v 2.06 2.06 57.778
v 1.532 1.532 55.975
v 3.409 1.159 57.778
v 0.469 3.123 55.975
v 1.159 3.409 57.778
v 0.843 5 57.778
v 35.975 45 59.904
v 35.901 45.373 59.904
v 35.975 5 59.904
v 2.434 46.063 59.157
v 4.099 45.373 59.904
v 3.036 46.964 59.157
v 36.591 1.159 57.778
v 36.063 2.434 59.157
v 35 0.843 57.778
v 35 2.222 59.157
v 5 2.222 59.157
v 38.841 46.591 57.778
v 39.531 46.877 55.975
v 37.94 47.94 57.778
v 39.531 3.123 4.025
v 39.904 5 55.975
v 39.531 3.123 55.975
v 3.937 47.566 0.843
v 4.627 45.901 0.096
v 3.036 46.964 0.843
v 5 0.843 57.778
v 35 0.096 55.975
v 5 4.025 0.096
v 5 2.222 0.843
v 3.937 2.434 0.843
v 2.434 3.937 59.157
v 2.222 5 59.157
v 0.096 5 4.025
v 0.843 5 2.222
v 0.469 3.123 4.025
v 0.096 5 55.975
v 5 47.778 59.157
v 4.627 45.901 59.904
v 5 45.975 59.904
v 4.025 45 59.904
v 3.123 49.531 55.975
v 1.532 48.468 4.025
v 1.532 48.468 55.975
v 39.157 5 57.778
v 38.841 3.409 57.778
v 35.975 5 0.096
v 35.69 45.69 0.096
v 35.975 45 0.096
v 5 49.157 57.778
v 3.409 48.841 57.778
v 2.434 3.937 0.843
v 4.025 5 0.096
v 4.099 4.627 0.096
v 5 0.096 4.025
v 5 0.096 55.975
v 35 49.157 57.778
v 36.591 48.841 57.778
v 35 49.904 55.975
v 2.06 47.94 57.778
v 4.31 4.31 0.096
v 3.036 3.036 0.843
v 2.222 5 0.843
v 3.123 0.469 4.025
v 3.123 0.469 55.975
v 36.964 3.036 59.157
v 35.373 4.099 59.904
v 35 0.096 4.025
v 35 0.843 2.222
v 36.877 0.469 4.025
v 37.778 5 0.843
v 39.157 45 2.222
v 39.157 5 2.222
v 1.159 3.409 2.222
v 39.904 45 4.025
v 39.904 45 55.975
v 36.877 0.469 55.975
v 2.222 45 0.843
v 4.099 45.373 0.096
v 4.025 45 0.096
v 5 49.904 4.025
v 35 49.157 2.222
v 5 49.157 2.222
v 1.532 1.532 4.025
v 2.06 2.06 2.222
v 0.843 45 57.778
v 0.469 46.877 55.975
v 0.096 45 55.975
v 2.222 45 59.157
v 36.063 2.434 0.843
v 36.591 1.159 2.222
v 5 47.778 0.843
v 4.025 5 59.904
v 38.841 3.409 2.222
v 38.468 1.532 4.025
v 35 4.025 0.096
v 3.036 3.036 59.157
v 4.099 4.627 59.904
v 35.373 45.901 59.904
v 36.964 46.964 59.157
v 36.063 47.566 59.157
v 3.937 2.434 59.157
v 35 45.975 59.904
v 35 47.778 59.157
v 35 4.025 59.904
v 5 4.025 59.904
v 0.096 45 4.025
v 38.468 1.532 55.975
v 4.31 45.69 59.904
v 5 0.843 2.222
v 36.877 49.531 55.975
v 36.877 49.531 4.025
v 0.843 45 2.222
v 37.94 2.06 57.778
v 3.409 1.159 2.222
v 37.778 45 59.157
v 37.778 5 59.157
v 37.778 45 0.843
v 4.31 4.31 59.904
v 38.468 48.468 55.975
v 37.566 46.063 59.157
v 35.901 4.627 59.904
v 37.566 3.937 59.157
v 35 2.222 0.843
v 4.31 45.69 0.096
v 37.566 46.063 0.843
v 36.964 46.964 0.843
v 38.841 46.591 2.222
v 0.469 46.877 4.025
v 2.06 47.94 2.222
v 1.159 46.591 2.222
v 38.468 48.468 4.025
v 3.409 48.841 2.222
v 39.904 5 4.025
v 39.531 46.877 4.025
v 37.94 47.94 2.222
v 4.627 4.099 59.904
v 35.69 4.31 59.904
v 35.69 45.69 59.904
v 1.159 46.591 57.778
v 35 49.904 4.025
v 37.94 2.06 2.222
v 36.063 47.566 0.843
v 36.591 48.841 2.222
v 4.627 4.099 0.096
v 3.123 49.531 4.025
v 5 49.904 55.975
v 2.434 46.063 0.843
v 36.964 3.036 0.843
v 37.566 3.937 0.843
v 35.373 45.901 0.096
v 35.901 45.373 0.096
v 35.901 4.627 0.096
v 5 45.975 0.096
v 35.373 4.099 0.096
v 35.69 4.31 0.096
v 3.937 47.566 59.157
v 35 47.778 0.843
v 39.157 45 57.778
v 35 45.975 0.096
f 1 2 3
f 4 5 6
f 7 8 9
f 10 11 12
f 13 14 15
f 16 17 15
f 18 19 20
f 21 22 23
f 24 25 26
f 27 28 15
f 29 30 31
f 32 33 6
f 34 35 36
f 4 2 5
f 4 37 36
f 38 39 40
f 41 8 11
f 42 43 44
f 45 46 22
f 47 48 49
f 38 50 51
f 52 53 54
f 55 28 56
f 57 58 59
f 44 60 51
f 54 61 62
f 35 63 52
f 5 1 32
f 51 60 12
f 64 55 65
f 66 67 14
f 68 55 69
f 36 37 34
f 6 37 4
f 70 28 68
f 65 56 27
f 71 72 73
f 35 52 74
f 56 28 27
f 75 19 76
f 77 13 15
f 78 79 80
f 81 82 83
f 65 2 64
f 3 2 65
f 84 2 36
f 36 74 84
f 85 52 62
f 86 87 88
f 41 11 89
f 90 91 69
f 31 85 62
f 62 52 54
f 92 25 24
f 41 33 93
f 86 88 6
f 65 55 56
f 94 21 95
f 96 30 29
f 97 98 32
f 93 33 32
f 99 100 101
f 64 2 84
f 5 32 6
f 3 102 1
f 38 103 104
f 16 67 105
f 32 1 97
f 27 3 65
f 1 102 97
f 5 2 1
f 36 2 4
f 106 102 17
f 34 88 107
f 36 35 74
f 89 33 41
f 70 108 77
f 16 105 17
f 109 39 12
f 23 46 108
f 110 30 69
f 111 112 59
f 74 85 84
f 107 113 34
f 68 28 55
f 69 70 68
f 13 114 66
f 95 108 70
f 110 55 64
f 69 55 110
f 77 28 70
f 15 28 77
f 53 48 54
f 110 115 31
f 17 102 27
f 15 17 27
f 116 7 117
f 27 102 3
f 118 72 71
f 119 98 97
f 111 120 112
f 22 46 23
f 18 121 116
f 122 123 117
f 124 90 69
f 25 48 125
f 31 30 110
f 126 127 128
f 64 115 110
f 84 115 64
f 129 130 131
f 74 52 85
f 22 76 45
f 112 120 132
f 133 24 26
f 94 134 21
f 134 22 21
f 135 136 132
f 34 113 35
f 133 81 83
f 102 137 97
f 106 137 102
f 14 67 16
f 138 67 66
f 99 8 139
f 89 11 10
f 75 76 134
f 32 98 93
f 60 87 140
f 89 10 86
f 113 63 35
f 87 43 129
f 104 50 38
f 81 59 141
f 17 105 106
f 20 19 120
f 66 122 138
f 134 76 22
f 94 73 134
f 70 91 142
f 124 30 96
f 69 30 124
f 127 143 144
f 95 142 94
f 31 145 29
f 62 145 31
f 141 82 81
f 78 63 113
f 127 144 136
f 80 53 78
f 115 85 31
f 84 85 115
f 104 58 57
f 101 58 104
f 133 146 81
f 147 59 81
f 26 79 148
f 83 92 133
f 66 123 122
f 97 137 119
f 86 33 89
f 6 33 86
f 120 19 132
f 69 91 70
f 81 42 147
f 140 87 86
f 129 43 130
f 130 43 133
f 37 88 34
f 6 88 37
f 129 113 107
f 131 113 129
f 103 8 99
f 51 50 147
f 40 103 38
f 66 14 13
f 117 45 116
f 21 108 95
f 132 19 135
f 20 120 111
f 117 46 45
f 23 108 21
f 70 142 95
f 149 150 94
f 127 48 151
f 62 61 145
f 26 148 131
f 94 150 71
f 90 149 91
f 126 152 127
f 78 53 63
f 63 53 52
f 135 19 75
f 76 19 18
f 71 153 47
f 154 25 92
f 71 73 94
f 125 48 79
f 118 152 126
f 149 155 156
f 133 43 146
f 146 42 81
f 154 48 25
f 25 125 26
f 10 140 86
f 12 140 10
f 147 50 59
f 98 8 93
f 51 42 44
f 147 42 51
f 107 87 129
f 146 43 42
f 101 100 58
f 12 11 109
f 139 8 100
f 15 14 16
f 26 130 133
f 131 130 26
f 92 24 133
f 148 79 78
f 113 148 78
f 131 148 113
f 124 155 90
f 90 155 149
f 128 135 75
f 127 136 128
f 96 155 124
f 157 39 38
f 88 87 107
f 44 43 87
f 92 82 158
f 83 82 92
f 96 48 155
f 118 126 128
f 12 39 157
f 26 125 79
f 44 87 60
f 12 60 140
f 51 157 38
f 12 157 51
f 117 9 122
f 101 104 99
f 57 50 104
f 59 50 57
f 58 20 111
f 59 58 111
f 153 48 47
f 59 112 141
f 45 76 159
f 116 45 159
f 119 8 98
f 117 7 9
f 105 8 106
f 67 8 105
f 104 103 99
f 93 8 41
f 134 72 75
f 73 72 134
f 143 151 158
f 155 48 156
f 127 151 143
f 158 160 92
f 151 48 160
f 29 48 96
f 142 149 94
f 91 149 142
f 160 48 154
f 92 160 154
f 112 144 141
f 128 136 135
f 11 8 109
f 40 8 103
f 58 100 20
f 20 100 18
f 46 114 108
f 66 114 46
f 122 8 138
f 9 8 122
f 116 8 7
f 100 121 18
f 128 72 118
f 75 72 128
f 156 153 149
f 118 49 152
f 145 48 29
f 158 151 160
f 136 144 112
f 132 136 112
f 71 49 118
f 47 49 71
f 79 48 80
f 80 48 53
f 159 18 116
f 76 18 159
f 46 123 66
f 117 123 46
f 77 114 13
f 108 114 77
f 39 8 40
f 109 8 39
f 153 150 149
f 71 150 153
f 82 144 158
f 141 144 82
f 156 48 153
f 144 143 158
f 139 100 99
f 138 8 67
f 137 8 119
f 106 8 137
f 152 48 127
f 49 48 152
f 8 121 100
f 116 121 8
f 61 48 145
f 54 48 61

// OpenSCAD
module radiusedBlock(xlen, ylen, zlen, radius) {
  hull() {
    translate([radius,radius,radius]) sphere(r=radius);
    translate([xlen + radius , radius , radius]) sphere(r=radius);
    translate([radius , ylen + radius , radius]) sphere(r=radius);
    translate([xlen + radius , ylen + radius , radius]) sphere(r=radius);
    translate([radius , radius , zlen + radius]) sphere(r=radius);
    translate([xlen + radius , radius , zlen + radius]) sphere(r=radius);
    translate([radius,ylen + radius,zlen + radius]) sphere(r=radius);
    translate([xlen + radius,ylen + radius,zlen + radius]) sphere(r=radius);
  }
}
radiusedBlock(30, 40, 50, 5);
